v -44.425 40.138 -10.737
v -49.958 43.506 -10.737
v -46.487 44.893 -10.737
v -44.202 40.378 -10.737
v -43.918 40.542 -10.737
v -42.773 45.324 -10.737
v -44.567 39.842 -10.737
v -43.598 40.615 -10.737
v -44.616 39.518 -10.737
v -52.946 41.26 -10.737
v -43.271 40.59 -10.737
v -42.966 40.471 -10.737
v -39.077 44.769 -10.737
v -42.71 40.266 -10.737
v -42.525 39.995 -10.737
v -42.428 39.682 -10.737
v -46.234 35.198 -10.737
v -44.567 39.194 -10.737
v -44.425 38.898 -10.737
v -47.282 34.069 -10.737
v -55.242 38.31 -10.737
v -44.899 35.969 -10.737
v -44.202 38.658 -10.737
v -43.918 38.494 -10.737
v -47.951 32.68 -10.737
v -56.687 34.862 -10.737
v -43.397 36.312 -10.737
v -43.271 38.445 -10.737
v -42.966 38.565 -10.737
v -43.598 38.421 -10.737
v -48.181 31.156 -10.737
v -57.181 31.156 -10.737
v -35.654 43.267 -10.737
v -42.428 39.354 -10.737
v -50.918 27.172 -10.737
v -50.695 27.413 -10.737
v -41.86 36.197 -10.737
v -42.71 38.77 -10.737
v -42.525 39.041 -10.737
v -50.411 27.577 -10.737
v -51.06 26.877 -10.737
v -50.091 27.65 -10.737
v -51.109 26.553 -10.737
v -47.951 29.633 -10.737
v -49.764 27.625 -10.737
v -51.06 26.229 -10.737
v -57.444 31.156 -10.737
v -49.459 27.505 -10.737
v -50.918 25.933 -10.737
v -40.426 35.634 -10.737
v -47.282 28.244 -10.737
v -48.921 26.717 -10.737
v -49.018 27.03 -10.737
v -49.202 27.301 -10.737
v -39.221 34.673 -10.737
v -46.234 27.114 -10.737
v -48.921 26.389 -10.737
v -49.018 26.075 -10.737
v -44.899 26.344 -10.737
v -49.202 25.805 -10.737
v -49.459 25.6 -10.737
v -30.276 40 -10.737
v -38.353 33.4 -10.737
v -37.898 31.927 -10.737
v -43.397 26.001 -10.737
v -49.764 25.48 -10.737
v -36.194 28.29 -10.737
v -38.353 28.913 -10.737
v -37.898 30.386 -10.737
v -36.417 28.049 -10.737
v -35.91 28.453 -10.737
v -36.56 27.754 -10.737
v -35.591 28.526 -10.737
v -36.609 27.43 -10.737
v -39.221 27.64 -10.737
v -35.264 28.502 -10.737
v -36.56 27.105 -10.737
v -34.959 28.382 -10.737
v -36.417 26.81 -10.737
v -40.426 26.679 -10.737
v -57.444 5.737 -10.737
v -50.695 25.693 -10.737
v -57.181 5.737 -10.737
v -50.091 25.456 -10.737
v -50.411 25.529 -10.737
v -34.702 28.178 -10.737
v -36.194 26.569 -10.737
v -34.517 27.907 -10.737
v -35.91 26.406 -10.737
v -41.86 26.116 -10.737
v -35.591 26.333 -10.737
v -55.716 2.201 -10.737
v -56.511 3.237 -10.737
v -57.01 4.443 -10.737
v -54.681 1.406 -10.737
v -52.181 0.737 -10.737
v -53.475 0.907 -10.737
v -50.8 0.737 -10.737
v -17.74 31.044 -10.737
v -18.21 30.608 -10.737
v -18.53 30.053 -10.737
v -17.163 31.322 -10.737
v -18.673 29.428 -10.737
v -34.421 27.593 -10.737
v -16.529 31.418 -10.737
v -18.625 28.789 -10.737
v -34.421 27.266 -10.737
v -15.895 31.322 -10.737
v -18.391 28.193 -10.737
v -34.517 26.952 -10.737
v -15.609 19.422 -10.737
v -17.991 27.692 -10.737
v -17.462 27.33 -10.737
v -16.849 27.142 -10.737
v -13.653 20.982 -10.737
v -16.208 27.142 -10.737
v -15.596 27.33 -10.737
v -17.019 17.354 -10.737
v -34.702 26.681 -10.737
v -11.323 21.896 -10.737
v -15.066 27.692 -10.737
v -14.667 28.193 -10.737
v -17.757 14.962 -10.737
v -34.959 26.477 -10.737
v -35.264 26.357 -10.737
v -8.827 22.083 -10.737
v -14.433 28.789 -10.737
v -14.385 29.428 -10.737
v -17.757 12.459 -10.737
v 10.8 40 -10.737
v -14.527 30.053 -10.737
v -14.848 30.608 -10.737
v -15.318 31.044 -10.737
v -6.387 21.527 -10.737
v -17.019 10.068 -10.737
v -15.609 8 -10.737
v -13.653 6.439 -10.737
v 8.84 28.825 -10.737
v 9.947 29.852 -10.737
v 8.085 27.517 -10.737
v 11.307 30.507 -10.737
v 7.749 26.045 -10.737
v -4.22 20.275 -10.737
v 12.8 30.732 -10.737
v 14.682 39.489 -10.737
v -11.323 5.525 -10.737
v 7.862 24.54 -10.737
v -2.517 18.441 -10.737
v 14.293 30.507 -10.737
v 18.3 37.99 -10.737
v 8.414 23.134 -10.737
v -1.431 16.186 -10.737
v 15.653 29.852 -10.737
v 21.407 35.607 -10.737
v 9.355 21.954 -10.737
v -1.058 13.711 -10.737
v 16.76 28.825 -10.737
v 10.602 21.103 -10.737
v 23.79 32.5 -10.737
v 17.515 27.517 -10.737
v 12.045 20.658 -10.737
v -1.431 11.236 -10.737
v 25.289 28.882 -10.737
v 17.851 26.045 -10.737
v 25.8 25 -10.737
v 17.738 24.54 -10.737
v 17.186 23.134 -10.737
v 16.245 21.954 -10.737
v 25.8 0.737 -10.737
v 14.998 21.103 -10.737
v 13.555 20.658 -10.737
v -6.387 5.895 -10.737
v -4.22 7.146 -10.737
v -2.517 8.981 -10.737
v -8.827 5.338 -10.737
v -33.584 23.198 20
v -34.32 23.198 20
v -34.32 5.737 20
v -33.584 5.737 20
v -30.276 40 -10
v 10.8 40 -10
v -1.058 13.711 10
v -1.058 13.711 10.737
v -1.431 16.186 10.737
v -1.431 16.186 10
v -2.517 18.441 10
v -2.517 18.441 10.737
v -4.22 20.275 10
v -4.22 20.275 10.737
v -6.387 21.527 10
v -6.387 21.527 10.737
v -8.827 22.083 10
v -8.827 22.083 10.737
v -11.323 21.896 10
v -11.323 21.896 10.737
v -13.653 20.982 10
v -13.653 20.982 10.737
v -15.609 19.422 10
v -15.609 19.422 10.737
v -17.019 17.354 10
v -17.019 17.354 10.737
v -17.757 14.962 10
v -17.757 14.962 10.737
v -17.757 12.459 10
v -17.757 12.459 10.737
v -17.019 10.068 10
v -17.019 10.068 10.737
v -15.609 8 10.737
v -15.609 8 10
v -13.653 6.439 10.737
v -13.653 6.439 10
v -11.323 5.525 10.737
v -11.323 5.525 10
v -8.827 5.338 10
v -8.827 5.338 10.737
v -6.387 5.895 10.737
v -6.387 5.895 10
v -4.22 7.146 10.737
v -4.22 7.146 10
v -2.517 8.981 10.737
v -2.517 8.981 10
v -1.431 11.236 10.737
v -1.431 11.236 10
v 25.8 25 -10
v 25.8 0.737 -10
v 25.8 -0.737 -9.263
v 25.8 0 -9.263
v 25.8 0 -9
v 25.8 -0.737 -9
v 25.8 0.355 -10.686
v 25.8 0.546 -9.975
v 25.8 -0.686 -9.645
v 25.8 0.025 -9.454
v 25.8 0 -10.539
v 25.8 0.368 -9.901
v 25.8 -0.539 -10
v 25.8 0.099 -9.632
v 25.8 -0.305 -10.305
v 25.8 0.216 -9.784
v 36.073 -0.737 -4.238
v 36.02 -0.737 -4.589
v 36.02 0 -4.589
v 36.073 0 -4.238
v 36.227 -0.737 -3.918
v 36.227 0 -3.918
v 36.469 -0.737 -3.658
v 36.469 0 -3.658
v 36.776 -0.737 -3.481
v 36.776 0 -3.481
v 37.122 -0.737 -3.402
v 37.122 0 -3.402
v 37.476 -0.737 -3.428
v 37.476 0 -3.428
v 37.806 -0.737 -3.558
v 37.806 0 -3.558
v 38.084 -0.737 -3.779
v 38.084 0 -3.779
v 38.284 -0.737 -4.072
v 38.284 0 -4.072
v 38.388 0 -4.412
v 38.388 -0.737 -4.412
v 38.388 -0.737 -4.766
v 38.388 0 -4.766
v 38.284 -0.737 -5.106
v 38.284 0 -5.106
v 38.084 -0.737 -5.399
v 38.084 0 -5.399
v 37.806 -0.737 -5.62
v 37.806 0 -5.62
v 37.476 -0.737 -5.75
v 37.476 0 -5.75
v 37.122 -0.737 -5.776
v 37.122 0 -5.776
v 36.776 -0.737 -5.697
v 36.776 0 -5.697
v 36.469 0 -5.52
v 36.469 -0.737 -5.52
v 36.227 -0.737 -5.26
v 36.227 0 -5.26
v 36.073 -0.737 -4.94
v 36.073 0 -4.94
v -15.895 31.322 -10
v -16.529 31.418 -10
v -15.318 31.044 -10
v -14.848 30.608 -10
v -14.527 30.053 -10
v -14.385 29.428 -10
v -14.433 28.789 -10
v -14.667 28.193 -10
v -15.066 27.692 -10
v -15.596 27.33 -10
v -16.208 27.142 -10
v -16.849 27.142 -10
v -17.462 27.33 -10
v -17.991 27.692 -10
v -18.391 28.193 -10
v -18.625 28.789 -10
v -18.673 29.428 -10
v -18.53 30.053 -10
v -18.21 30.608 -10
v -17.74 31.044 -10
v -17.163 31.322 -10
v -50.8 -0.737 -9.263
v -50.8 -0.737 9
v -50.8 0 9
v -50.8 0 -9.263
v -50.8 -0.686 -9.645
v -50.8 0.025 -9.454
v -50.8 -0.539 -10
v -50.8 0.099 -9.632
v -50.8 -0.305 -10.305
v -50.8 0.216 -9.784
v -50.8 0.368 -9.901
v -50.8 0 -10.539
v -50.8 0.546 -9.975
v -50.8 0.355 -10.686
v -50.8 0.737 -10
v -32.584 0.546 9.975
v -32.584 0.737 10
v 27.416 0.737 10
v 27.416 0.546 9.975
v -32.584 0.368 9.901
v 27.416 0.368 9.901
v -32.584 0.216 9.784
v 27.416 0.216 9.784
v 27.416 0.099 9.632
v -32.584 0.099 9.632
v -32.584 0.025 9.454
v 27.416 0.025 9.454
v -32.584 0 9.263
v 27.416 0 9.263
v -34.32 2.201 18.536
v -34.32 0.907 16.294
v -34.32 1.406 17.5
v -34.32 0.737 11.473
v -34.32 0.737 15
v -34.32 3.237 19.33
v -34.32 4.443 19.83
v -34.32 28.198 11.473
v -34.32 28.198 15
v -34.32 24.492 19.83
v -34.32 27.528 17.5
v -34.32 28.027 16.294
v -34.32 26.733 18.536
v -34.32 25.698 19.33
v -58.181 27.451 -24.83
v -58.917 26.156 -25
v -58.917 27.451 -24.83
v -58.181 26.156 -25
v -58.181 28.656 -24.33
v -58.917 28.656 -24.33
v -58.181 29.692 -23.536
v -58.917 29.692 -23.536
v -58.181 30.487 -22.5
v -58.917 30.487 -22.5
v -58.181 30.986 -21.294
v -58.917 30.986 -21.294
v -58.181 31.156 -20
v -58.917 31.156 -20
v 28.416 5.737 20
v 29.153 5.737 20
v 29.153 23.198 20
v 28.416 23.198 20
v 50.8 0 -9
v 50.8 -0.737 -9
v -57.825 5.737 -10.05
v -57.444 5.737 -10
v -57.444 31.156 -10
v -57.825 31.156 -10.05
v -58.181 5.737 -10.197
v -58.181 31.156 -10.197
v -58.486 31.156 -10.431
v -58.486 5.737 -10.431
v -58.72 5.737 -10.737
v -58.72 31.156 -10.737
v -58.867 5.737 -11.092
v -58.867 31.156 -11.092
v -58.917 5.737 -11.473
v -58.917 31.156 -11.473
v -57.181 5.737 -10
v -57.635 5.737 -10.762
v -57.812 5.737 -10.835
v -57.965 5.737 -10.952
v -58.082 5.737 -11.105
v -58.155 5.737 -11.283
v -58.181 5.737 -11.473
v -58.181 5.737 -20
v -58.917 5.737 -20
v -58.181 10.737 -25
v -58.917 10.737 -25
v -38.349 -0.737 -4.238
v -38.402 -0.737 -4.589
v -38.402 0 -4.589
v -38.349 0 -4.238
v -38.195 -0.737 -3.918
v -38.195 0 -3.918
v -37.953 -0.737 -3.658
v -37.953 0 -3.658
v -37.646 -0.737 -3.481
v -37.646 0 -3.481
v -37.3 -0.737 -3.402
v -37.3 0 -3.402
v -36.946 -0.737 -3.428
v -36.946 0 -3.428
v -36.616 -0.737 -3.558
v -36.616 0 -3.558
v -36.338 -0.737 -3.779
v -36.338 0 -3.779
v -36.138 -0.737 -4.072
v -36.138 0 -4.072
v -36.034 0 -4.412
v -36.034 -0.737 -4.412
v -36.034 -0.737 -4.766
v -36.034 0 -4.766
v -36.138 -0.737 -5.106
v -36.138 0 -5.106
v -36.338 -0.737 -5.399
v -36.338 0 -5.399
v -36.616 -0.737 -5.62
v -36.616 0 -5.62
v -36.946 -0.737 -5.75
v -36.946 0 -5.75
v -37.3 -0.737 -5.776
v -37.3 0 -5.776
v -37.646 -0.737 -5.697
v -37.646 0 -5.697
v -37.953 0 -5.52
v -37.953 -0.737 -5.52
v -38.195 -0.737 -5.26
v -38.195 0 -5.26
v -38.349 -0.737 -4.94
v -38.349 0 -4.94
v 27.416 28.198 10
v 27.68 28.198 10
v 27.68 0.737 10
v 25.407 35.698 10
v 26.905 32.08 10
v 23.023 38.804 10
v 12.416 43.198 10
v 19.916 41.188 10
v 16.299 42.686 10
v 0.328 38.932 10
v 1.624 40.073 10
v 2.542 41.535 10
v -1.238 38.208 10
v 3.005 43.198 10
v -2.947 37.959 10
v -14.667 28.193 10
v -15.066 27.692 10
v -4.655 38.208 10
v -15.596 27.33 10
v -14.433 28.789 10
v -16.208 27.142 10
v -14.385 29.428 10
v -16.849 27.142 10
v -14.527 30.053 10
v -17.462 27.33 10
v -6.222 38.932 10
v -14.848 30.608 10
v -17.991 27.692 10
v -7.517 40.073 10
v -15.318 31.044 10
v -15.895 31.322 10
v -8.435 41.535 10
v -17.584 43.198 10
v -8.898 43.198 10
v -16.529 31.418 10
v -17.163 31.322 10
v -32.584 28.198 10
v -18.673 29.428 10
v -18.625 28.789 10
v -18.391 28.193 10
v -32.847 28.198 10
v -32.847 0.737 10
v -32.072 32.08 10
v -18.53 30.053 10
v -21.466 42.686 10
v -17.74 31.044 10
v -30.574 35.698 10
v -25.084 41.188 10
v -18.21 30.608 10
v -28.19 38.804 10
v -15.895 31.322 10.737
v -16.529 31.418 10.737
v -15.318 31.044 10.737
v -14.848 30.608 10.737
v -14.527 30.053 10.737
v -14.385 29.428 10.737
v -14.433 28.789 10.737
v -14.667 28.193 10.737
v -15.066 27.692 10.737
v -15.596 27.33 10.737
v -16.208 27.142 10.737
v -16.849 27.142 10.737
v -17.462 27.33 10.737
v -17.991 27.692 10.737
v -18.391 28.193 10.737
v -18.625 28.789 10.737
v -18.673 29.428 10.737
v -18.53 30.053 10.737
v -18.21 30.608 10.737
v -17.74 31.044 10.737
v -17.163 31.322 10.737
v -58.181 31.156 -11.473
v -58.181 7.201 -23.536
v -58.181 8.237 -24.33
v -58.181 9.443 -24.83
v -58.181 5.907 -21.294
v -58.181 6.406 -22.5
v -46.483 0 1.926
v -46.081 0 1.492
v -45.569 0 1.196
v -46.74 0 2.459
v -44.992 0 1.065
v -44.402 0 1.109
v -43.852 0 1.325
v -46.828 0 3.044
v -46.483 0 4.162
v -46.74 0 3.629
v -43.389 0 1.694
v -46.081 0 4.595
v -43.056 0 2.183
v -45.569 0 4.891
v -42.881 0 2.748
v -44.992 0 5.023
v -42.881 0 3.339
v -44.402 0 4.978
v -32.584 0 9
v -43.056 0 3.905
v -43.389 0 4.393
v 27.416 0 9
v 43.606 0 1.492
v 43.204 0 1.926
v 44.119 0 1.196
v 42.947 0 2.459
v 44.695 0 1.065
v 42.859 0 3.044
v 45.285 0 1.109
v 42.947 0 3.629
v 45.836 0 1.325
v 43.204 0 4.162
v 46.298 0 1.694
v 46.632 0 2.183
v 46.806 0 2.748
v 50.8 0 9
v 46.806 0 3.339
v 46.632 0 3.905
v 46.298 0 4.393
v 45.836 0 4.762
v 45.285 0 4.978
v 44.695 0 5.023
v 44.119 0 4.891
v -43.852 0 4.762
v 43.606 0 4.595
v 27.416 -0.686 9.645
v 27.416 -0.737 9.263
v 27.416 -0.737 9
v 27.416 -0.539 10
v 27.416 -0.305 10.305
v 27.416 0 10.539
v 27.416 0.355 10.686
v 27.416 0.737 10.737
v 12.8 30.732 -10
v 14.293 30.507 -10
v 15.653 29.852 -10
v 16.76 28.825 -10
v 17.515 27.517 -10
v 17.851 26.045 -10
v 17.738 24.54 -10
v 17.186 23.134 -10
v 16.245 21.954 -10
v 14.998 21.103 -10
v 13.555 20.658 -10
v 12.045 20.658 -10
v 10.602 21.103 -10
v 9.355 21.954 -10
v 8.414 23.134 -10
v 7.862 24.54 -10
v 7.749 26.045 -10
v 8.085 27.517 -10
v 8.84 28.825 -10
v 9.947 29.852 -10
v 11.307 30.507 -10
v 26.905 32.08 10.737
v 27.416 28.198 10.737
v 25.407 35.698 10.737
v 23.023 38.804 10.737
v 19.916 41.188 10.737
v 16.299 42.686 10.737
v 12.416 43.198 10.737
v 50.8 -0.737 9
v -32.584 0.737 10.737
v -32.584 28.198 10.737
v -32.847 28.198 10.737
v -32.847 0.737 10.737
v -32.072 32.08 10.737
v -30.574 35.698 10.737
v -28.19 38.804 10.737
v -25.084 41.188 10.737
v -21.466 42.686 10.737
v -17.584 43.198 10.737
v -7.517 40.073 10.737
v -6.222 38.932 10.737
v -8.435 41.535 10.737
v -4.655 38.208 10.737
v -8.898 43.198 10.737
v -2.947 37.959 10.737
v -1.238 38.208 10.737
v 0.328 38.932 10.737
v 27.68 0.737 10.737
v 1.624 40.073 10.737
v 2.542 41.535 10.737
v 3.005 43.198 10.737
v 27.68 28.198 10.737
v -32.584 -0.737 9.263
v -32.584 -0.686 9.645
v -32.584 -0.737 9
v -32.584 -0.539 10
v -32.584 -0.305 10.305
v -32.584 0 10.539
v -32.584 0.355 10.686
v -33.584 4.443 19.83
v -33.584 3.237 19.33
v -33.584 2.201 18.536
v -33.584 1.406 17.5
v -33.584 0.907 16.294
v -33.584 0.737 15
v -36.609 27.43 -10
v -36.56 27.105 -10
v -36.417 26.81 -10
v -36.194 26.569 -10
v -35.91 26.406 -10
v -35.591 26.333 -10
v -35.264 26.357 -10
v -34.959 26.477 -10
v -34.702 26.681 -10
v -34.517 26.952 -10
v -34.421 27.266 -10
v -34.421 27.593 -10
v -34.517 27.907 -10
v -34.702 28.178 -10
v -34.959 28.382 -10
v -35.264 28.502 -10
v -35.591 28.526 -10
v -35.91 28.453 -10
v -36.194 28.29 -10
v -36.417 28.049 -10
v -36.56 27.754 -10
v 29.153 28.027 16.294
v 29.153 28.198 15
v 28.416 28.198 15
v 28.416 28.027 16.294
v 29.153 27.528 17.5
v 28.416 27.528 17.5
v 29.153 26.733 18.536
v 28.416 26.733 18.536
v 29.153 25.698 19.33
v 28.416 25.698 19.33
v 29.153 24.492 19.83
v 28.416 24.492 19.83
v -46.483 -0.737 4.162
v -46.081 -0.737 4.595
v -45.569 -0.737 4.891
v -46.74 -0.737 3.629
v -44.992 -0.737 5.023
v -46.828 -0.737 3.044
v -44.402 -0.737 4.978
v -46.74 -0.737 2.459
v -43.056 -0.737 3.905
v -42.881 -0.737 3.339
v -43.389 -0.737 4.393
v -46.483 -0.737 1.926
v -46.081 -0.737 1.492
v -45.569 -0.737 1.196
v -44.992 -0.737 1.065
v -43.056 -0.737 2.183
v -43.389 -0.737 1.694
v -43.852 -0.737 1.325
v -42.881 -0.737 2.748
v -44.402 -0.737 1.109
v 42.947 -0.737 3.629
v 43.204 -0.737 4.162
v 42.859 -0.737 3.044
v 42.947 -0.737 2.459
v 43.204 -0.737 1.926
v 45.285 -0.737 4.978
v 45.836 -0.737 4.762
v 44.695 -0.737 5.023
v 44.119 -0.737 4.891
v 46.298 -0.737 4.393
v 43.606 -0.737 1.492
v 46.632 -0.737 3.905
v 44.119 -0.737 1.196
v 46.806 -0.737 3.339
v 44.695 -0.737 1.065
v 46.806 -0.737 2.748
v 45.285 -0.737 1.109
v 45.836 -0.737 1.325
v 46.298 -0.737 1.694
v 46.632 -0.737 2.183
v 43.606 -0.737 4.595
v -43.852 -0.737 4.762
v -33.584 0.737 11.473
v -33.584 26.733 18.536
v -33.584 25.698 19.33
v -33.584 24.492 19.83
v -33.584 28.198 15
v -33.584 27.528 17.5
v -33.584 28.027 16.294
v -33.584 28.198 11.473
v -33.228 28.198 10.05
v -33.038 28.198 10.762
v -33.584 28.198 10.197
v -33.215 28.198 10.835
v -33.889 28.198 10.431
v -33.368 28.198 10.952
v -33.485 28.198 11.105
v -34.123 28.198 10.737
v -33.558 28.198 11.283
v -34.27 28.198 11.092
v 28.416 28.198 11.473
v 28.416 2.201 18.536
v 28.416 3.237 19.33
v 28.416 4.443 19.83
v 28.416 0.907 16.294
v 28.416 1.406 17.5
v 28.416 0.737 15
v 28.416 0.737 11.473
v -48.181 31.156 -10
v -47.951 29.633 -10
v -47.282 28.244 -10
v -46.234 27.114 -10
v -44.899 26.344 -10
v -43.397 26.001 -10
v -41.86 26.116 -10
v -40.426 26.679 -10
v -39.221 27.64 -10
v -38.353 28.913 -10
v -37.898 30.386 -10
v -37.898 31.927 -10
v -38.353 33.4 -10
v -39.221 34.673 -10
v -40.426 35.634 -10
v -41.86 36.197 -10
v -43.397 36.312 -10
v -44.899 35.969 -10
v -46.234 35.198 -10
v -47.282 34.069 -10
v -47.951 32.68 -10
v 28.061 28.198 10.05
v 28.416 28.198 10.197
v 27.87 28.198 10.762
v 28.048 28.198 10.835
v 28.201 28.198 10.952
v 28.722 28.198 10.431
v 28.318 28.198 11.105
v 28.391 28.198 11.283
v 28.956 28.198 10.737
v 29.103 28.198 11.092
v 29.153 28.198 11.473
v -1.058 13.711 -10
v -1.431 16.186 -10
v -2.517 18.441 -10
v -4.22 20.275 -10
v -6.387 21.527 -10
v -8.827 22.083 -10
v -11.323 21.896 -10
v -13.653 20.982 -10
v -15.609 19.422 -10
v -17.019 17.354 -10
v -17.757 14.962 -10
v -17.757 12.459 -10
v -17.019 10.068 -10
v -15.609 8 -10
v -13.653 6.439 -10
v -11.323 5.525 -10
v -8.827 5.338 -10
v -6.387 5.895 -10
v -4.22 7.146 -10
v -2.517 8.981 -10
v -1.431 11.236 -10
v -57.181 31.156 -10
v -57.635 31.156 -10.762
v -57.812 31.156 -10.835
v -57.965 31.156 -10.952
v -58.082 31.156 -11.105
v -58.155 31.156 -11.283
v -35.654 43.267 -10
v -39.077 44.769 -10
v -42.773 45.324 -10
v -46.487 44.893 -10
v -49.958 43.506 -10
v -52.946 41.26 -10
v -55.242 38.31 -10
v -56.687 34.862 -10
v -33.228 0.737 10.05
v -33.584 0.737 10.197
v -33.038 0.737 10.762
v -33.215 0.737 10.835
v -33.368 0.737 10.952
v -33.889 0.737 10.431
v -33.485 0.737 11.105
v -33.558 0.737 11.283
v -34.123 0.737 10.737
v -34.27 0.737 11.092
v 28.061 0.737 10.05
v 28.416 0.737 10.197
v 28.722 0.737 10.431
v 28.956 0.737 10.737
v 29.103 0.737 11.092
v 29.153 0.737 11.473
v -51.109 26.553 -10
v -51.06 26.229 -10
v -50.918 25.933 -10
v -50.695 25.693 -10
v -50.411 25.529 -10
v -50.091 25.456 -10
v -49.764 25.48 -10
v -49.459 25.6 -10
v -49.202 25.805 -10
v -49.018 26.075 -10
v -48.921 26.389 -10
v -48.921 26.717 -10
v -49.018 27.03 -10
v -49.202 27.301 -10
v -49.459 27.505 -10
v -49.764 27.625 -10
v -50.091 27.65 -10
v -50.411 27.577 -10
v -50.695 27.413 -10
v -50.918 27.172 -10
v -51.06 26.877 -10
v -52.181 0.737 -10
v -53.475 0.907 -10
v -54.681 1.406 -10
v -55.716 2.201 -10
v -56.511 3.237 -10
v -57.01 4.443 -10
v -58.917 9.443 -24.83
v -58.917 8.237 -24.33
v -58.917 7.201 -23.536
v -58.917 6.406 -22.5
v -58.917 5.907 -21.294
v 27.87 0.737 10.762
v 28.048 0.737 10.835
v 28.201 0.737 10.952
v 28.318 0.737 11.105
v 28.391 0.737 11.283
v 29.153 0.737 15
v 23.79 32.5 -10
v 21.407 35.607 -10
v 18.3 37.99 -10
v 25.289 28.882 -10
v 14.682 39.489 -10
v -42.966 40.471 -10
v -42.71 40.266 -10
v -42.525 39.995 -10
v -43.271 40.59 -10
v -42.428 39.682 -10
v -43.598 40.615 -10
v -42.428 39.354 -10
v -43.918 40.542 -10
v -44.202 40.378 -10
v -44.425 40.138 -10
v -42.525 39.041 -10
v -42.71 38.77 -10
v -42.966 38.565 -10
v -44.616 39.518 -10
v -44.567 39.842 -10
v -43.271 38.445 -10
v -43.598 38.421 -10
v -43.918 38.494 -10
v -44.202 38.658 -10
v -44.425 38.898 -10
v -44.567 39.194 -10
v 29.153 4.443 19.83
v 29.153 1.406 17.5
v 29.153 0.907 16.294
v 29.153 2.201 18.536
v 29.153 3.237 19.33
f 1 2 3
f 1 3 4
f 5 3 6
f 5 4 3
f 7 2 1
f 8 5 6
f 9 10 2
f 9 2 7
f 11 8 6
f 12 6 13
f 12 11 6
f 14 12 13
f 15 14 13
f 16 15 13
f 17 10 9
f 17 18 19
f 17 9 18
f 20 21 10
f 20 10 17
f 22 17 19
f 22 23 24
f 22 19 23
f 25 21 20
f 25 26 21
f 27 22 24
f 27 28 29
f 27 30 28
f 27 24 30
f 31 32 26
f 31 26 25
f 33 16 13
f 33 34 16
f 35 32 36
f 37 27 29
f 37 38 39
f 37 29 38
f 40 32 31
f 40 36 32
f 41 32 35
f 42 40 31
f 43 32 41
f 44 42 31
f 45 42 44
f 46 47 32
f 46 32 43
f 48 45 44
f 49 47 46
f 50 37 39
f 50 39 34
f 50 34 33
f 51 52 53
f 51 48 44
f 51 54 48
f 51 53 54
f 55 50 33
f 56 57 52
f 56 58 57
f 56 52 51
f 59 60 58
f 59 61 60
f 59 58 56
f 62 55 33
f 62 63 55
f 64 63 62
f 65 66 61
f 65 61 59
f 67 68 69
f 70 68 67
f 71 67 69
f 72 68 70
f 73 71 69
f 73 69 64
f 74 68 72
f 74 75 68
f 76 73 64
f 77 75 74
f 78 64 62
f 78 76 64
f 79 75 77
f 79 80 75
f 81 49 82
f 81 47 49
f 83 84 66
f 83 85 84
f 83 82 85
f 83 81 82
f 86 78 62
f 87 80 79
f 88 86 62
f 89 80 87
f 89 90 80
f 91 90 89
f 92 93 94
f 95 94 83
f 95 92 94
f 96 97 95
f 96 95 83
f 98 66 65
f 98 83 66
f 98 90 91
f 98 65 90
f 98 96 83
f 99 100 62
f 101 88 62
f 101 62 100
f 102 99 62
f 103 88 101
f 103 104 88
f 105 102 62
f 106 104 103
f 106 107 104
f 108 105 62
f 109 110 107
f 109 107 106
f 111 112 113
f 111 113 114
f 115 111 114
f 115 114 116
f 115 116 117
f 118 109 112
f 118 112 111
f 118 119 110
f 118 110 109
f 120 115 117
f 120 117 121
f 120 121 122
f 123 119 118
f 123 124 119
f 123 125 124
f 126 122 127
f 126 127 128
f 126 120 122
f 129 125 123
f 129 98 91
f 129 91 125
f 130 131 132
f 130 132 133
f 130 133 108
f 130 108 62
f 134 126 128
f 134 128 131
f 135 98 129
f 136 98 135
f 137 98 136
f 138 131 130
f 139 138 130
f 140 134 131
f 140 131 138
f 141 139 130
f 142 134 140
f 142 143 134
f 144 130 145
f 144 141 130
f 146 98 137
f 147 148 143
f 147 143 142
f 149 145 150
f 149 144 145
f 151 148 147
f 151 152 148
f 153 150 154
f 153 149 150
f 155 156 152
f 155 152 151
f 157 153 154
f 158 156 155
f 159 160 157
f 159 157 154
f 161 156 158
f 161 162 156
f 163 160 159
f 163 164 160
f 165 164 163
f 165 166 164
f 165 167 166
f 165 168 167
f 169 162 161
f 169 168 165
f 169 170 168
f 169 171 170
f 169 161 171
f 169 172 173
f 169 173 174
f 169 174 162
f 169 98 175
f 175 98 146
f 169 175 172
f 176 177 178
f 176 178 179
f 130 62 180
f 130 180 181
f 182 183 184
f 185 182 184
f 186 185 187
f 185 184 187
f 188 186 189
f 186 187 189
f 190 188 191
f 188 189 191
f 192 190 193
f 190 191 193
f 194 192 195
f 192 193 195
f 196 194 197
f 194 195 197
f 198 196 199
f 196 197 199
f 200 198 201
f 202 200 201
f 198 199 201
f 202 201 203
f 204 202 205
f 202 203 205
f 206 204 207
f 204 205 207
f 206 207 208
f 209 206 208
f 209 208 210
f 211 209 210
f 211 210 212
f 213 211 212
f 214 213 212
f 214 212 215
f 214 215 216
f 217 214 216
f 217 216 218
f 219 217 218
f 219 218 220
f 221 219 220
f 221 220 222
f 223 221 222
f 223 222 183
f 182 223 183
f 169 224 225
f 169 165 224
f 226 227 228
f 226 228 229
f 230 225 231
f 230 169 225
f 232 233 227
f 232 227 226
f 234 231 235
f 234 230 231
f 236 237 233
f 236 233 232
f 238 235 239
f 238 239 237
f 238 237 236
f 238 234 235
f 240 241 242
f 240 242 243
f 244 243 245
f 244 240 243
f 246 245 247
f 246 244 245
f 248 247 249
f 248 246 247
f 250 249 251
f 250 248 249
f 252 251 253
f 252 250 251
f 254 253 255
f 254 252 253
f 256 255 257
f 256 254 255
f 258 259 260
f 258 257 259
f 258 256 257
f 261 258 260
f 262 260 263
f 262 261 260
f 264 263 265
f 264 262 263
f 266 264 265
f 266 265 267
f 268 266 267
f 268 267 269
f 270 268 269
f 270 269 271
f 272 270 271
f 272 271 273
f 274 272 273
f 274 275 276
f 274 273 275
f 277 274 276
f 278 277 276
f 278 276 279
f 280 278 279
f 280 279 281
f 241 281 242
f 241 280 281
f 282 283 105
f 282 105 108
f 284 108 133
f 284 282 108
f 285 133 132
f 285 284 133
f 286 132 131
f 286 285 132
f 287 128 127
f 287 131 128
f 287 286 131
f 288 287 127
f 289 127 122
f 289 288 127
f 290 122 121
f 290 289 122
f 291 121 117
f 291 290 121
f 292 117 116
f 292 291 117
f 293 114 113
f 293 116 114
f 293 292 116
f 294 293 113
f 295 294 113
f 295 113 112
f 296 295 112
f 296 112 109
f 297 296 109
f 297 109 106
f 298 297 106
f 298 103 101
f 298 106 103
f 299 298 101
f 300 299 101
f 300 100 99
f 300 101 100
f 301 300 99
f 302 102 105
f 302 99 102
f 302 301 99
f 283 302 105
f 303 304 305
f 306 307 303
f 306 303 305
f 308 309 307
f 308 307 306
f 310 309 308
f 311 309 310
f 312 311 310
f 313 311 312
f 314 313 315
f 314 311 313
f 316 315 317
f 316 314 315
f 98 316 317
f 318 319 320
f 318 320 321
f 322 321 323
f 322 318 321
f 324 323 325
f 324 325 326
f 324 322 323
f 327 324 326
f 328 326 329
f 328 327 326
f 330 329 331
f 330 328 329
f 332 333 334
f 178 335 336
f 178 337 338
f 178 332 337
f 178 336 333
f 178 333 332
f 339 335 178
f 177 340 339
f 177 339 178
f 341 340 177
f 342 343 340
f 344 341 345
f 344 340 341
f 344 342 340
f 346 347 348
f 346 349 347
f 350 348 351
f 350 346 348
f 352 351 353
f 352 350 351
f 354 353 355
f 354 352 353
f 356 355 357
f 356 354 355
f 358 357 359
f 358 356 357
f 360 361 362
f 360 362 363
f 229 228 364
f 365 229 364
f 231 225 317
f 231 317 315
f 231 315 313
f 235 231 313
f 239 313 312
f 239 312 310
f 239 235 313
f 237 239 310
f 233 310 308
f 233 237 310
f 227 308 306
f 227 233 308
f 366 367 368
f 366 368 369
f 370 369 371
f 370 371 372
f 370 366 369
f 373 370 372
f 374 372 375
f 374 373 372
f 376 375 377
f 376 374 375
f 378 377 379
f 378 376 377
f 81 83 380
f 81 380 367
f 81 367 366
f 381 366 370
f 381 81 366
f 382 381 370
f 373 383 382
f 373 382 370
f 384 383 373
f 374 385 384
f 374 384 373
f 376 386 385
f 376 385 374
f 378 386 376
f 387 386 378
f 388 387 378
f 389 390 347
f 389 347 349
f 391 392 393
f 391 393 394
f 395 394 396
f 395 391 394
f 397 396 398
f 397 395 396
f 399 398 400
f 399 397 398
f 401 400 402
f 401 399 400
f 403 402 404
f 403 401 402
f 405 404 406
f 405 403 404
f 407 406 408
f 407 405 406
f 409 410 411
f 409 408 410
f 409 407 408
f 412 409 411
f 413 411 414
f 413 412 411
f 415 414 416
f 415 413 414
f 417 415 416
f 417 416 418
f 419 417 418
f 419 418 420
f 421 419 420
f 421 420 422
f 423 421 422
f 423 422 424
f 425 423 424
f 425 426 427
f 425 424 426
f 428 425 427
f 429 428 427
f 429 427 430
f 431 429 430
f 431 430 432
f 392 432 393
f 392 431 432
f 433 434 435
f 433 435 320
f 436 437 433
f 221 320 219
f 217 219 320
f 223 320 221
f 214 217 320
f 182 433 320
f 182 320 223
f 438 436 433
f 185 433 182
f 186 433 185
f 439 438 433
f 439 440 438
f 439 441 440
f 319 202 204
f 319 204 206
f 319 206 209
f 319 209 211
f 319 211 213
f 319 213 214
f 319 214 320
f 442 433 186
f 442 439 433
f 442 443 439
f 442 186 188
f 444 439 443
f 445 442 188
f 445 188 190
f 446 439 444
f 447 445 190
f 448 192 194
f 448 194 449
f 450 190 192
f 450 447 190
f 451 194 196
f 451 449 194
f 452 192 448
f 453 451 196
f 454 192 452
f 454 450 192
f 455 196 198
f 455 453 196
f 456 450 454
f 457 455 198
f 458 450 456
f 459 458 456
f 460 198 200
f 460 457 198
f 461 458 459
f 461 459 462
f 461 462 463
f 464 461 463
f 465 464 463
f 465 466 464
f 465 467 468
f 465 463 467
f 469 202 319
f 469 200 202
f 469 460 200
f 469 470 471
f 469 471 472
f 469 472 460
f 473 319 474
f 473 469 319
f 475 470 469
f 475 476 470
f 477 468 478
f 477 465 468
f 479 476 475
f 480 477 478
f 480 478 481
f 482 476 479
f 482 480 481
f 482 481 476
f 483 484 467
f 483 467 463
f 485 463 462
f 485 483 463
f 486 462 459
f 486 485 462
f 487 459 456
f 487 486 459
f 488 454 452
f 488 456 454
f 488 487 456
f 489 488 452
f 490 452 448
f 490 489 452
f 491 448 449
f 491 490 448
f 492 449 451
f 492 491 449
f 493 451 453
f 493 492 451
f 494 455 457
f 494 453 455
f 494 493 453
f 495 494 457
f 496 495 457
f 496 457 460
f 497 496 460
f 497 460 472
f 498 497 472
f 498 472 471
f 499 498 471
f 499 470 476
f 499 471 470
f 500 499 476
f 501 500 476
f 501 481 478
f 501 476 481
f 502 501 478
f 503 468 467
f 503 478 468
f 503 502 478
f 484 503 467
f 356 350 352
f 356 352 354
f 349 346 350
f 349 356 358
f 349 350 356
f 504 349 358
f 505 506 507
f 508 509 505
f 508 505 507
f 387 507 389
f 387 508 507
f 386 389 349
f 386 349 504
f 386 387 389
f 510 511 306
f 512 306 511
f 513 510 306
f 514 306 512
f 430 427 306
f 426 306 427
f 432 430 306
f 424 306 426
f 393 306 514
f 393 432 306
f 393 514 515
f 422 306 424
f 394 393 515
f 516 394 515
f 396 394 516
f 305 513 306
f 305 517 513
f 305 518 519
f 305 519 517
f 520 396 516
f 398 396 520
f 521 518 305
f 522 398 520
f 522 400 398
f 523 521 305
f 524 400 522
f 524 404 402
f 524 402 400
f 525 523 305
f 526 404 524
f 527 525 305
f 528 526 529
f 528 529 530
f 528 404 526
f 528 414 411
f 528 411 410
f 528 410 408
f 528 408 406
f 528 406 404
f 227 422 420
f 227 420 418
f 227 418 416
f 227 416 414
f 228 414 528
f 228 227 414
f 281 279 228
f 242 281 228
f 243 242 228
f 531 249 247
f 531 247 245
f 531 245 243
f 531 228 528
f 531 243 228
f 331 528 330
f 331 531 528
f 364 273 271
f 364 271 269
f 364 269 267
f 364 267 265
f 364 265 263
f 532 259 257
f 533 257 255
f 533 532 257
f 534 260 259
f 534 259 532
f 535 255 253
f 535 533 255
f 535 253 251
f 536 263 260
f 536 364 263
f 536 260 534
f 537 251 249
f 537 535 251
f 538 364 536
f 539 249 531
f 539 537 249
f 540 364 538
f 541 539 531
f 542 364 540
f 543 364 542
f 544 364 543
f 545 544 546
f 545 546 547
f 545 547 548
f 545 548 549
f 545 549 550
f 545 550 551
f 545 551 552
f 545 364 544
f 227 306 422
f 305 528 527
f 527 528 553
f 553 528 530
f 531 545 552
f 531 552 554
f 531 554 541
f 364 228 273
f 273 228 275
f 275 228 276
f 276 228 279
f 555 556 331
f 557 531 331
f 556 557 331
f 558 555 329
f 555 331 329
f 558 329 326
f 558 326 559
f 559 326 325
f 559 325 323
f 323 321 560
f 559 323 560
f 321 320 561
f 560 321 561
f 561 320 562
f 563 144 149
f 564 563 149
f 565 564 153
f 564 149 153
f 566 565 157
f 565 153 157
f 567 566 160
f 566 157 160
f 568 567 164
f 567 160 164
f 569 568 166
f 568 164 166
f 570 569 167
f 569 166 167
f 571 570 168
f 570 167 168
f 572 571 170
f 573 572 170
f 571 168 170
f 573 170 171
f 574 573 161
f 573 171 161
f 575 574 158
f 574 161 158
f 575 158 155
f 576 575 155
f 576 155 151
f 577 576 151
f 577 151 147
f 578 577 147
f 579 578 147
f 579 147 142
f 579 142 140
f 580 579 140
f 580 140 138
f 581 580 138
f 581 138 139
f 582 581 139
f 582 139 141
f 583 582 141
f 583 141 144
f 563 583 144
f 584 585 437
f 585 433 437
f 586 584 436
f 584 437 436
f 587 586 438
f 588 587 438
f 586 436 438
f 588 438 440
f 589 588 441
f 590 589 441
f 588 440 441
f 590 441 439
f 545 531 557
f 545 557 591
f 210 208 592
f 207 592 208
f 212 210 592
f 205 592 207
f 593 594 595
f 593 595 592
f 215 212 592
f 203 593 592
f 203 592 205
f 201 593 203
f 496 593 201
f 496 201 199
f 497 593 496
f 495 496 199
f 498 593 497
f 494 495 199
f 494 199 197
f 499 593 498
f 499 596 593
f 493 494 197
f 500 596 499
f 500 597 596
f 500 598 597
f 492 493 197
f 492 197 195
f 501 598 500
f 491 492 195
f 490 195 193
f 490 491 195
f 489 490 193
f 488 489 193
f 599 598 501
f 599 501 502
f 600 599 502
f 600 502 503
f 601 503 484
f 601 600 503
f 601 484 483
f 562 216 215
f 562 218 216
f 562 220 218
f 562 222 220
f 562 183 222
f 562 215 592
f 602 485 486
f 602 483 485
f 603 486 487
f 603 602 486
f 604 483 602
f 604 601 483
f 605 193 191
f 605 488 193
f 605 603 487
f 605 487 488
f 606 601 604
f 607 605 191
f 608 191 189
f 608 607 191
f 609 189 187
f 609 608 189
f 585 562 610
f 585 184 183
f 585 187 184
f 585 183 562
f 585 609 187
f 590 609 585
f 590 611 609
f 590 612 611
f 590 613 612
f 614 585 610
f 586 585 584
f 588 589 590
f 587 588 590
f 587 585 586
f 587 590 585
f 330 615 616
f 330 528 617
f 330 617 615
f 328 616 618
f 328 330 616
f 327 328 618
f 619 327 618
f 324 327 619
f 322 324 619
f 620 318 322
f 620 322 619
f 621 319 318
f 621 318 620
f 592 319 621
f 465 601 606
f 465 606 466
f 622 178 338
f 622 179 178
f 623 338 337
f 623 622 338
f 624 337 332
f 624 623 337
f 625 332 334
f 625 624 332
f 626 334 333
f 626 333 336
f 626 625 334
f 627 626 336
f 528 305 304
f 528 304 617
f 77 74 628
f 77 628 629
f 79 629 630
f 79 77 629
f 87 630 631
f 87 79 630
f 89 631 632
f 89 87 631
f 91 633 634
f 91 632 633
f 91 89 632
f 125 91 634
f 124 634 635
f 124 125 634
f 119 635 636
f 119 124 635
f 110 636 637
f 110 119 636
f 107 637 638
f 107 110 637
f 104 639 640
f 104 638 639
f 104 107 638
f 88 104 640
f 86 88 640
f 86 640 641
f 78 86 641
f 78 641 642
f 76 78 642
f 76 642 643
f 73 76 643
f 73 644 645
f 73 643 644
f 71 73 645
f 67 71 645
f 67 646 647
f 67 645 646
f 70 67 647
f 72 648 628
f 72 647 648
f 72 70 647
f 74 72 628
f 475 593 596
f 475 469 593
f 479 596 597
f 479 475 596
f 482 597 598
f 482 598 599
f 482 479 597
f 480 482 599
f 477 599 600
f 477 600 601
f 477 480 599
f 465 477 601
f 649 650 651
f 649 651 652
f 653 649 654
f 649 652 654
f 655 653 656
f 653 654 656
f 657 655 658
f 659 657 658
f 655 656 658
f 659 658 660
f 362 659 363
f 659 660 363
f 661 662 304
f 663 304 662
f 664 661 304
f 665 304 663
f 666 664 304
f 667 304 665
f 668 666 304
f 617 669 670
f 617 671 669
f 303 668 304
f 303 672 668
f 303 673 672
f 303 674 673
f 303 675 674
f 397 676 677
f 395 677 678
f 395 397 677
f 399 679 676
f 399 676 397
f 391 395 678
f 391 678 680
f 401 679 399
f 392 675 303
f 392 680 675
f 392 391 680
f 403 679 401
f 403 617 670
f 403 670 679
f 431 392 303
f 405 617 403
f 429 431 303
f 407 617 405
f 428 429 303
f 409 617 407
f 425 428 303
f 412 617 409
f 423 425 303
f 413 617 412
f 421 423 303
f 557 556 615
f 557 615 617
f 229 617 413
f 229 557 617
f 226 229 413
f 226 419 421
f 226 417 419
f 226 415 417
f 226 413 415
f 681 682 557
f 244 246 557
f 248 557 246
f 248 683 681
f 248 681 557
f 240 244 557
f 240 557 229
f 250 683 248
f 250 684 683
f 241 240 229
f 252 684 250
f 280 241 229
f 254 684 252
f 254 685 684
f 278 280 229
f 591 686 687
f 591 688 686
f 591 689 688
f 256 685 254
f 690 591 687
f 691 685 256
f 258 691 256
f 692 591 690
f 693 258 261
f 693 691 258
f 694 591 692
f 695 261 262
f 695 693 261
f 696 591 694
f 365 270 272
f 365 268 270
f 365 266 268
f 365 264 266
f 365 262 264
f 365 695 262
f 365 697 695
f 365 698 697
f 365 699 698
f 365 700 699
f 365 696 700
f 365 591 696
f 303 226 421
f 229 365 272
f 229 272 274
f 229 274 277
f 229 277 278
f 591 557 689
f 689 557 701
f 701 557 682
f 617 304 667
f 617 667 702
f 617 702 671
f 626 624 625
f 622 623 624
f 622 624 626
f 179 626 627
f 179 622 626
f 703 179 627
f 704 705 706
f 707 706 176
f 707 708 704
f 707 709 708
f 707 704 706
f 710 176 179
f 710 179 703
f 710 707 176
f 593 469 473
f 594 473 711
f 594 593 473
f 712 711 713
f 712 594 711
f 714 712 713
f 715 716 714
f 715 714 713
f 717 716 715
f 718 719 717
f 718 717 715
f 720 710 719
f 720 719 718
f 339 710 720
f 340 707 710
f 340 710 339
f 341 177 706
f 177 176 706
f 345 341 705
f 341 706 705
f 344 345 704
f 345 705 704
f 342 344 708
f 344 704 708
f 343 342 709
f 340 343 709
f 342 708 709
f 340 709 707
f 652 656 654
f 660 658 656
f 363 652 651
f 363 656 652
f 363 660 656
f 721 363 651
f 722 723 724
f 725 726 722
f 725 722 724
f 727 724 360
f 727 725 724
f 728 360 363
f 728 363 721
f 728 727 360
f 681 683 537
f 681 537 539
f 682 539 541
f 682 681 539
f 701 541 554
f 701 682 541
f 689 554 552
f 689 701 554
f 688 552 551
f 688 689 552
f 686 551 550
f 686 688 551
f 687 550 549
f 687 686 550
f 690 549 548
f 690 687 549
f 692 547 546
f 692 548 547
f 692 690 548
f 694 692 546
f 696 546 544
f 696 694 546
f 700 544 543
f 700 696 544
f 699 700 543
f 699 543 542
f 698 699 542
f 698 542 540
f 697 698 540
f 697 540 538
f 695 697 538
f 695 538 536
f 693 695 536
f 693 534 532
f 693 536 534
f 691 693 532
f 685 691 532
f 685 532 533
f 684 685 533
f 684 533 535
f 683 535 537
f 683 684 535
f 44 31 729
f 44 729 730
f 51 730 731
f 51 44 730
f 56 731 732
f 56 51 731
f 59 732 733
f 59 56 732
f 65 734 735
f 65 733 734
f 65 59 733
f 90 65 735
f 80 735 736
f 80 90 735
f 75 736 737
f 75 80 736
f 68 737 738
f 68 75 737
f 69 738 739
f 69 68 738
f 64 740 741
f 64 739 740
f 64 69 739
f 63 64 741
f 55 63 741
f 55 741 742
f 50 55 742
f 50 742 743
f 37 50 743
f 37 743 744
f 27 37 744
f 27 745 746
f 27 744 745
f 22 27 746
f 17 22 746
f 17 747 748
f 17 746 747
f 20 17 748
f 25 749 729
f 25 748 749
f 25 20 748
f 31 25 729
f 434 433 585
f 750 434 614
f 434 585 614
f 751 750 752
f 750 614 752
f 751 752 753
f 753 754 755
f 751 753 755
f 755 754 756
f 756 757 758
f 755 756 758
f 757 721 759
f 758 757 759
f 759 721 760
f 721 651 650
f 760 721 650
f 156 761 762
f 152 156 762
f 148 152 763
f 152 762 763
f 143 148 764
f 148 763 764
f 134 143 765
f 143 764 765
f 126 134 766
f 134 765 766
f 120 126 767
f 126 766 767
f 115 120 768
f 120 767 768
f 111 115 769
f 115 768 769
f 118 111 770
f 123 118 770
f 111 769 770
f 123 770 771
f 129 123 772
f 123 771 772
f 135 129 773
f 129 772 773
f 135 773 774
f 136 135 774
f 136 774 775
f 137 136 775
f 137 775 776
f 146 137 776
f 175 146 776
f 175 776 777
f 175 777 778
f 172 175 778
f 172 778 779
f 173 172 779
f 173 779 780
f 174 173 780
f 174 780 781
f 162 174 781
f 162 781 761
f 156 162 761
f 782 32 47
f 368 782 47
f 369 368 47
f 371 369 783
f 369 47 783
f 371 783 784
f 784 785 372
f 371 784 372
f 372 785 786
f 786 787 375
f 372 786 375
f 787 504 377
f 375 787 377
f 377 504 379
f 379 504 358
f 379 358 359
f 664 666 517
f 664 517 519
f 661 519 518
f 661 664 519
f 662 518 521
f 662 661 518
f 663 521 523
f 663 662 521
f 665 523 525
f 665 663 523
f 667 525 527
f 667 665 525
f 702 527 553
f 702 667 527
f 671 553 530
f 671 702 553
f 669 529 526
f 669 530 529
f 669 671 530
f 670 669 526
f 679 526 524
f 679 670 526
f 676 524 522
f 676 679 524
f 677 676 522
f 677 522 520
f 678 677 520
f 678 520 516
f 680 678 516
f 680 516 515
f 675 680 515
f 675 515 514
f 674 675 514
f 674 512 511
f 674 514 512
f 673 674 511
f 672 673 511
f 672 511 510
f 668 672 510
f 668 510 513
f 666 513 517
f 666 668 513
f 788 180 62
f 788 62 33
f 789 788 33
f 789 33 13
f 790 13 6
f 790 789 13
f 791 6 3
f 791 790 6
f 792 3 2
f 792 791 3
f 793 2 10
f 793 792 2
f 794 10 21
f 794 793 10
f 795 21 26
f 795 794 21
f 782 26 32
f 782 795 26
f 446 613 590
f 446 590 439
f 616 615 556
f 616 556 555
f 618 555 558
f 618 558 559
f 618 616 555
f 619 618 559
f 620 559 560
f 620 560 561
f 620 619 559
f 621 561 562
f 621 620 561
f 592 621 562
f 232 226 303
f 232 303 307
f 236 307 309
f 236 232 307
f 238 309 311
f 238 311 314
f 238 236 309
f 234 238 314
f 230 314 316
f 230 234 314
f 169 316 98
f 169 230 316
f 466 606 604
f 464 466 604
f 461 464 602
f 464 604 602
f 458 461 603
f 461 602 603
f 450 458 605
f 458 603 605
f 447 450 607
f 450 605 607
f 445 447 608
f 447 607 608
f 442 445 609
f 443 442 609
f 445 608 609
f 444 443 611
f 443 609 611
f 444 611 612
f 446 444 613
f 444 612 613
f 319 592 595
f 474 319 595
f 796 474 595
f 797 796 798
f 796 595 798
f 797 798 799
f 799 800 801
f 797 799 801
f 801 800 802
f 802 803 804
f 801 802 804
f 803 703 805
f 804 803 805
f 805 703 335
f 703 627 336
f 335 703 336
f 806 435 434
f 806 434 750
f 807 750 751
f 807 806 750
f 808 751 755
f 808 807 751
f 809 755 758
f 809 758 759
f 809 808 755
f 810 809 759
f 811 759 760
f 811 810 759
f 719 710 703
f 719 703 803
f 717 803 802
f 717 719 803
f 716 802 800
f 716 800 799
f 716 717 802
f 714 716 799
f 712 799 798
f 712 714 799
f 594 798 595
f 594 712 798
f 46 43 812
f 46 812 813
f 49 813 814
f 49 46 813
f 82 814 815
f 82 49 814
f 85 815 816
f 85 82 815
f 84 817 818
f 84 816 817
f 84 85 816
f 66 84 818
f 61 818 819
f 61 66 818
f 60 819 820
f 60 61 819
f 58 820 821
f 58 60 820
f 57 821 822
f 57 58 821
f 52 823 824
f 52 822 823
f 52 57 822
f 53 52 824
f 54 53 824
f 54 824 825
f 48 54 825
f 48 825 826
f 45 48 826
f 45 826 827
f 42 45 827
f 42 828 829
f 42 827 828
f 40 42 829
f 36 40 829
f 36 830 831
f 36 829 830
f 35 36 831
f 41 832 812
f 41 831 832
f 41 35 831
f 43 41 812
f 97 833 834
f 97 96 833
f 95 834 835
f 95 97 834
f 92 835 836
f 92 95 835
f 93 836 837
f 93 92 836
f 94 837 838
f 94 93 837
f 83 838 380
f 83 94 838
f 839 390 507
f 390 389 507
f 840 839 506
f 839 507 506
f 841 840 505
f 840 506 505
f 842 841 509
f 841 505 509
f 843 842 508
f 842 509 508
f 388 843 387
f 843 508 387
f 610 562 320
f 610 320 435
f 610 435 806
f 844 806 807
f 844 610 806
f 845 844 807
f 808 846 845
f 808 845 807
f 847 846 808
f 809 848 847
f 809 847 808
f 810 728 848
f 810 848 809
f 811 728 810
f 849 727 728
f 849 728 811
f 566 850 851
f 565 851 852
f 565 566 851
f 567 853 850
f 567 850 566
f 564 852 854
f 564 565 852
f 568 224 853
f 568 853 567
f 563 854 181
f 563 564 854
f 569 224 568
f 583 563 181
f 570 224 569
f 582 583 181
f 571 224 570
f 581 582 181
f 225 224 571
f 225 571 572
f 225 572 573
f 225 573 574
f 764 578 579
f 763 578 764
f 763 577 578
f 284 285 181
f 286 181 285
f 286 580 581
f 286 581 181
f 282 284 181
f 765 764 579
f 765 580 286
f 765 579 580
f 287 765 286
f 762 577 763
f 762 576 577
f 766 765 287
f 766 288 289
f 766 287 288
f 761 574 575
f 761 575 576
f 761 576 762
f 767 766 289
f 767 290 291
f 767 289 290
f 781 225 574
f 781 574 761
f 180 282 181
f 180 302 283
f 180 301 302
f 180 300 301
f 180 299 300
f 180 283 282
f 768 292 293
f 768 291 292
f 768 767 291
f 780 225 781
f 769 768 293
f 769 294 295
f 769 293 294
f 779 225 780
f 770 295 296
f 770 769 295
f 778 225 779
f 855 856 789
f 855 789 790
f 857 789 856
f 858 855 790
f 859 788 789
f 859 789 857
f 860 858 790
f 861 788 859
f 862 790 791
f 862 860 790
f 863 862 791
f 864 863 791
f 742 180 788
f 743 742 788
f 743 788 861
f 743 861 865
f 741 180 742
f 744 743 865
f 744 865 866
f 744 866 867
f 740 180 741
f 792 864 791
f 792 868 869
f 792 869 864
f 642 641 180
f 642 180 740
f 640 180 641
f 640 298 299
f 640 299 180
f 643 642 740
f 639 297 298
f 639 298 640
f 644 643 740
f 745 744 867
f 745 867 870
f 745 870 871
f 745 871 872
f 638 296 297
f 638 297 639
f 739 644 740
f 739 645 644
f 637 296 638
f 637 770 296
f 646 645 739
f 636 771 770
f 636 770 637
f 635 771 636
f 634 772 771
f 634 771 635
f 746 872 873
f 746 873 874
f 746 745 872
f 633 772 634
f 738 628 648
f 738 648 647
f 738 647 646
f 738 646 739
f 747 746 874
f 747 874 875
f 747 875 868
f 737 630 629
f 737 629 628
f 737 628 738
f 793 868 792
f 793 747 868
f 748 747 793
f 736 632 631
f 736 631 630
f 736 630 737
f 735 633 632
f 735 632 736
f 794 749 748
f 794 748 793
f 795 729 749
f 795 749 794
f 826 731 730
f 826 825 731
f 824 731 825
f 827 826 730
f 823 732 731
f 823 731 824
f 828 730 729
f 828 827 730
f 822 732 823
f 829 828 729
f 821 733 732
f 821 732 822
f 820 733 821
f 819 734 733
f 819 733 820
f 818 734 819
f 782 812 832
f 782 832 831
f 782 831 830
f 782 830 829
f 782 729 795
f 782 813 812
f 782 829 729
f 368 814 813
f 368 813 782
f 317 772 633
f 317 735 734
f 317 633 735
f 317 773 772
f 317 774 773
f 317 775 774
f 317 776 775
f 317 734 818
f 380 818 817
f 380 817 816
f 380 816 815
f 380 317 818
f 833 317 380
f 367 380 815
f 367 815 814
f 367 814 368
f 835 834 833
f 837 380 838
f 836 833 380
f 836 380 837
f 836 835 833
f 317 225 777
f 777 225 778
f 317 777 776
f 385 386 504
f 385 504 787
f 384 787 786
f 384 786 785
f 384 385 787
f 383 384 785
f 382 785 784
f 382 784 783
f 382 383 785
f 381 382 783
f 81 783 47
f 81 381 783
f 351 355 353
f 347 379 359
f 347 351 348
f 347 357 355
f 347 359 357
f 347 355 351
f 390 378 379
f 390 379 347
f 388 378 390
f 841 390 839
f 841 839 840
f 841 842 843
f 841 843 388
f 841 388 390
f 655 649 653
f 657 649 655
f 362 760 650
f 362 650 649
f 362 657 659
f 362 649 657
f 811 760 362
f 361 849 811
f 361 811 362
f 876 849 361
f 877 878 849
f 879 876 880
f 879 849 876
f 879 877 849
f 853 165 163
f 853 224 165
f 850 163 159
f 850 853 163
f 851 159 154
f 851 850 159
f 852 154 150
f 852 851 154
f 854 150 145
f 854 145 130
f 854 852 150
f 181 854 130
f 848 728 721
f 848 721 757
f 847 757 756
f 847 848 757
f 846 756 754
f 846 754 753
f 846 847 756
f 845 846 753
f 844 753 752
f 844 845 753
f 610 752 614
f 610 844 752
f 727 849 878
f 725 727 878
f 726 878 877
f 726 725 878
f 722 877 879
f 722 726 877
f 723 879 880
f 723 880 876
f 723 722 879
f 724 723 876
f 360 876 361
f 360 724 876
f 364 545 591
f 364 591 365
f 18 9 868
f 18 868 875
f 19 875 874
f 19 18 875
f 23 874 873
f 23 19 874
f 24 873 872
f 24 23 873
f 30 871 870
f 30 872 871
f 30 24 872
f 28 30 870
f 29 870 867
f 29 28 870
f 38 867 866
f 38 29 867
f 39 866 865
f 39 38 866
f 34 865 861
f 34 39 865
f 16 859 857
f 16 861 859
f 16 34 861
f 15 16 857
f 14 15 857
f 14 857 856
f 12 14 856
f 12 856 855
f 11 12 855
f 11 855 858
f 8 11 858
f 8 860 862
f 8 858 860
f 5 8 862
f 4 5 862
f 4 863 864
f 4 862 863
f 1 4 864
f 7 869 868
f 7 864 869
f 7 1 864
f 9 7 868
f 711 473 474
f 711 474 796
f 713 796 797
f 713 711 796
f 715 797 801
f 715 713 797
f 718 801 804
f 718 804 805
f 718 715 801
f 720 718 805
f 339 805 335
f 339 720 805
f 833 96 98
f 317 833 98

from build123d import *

# Parameters (mm, degrees)
SKETCH1_W                = 101.6
SKETCH1_H                = 18
BASE_FLANGE1_DEPTH       = 0.7366
CUT_EXTRUDE1_DEPTH       = 248.362817644
CUT_EXTRUDE1_DEPTH_BACK  = 248.362817644
SKETCH9_R                = 1.984375
SKETCH9_R_2              = 1.190625
EDGE_FLANGE2_DEPTH       = 60
CUT_EXTRUDE10_DEPTH      = 276.770749451
CUT_EXTRUDE10_DEPTH_BACK = 276.770749451
SKETCH47_R               = 5.065
SKETCH48_R               = 6
CUT_EXTRUDE11_DEPTH      = 10
EDGE_FLANGE4_DEPTH       = 76.6
EDGE_FLANGE4_START       = 0.7366
EDGE_FLANGE4_FLAT_DEPTH  = 0.7366
CUT_EXTRUDE12_DEPTH      = 105.880550385
CUT_EXTRUDE12_DEPTH_BACK = 105.880550385
SKETCH52_R               = 2.15
TAB1_START               = -0.7366
TAB1_OUTLINE_W           = 10
TAB1_OUTLINE_H           = 49.408594005
TAB1_DEPTH               = 0.7366
SKETCH56_R               = 5.065
CUT_EXTRUDE13_DEPTH      = 5
CUT_EXTRUDE16_DEPTH      = 105.732220975
CUT_EXTRUDE16_DEPTH_BACK = 105.732220975
SKETCH59_R               = 1.1
SKETCH59_R_2             = 5.17
CUT_EXTRUDE18_DEPTH      = 10
FILLET1_R                = 5
EDGE_FLANGE5_DEPTH       = 25.419820015
FILLET2_R                = 5
FILLET3_R                = 15
EDGE_FLANGE6_DEPTH       = 27.460964596
EDGE_FLANGE6_BEND_DEPTH  = 27.460964596
FILLET4_R                = 5
SKETCH71_R               = 8.39617584
CUT_EXTRUDE19_DEPTH      = 83.479179892


# Read off the part's stored shape, not the designer's step: Tab1
# Sheet-metal steps are written as plain solids
with BuildPart() as part:
    # Sketch1 → Base-Flange1 (new body)
    with BuildSketch(Plane(origin=(0, 0, 0), x_dir=(1, 0, 0), z_dir=(0, 1, 0))):
        Rectangle(SKETCH1_W, SKETCH1_H)
    extrude(amount=-BASE_FLANGE1_DEPTH)

    # Sketch9 → Cut-Extrude1 (cut, two sides: drawn at the far end of the back side and taken through both)
    with BuildSketch(Plane(origin=(-165.711822879, -0.7366, -110.626299478), x_dir=(0.7071067811865437, 0, -0.7071067811865515), z_dir=(0, 1, 0)).offset(-CUT_EXTRUDE1_DEPTH_BACK)):
        with Locations(Location((5.089841868, -165.843496765, 0), (0, 0, 135))):
            Circle(SKETCH9_R)
        with Locations(Location((15.884109726, -165.843496765, 0), (0, 0, 135))):
            Circle(SKETCH9_R_2)
        with Locations(Location((68.508410595, -229.262065492, 0), (0, 0, 135))):
            Circle(SKETCH9_R)
        with Locations(Location((68.508410595, -218.467797635, 0), (0, 0, 135))):
            Circle(SKETCH9_R_2)
    extrude(amount=CUT_EXTRUDE1_DEPTH + CUT_EXTRUDE1_DEPTH_BACK, mode=Mode.SUBTRACT)

    # Edge-Flange2 section (across the edge) → Edge-Flange2 (add)
    with BuildSketch(Plane(origin=(-32.583570882, 0, 10), x_dir=(0, 0, -1), z_dir=(1, 0, 0))):
        with BuildLine():
            Line((-0.7366, 0.7366), (-0.7366, 43.197564596))
            Line((-0.7366, 43.197564596), (0, 43.197564596))
            Line((0, 43.197564596), (0, 0.7366))
            ThreePointArc((0, 0.7366), (0.215745145, 0.215745145), (0.7366, 0))
            Line((0.7366, 0), (1, 0))
            Line((1, 0), (1, -0.7366))
            Line((1, -0.7366), (0.7366, -0.7366))
            ThreePointArc((0.7366, -0.7366), (-0.30510971, -0.30510971), (-0.7366, 0.7366))
        make_face()
    extrude(amount=EDGE_FLANGE2_DEPTH)

    # Sketch47 → Cut-Extrude10 (cut, two sides: drawn at the far end of the back side and taken through both)
    with BuildSketch(Plane(origin=(-165.711822879, -125.530580752, -15.7766), x_dir=(1, 0, 0), z_dir=(0, 0, 1)).offset(-CUT_EXTRUDE10_DEPTH_BACK)):
        with Locations((162.765212711, 169.489973714)):
            Circle(SKETCH47_R)
    extrude(amount=CUT_EXTRUDE10_DEPTH + CUT_EXTRUDE10_DEPTH_BACK, mode=Mode.SUBTRACT)

    # Sketch48 → Cut-Extrude11 (cut)
    with BuildSketch(Plane.XY.offset(10.7366)):
        with Locations((-2.946610168, 43.959392962)):
            Circle(SKETCH48_R)
    extrude(amount=-CUT_EXTRUDE11_DEPTH, mode=Mode.SUBTRACT)

    # Edge-Flange4 bend section (across the edge) → Edge-Flange4 (add)
    with BuildSketch(Plane(origin=(25.8, 0, -10), x_dir=(0, 0, 1), z_dir=(-1, 0, 0))):
        with BuildLine():
            Line((-0.7366, 0.7366), (0, 0.7366))
            ThreePointArc((0, 0.7366), (0.215745145, 0.215745145), (0.7366, 0))
            Line((0.7366, 0), (1, 0))
            Line((1, 0), (1, -0.7366))
            Line((1, -0.7366), (0.7366, -0.7366))
            ThreePointArc((0.7366, -0.7366), (-0.30510971, -0.30510971), (-0.7366, 0.7366))
        make_face()
    extrude(amount=EDGE_FLANGE4_DEPTH)

    # Edge-Flange4 profile (on flange) → Edge-Flange4 flat (add)
    with BuildSketch(Plane(origin=(0, 0, -10), x_dir=(-1, 0, 0), z_dir=(0, 0, -1)).offset(EDGE_FLANGE4_START)):
        Polygon((-25.8, 40), (-25.8, 0.7366), (50.8, 0.7366), (50.8, 40), (50.8, 50.145194005), (30.27574847, 50.145194005), (30.27574847, 40), align=None)
    extrude(amount=-EDGE_FLANGE4_FLAT_DEPTH)

    # Sketch52 → Cut-Extrude12 (cut, two sides: drawn at the far end of the back side and taken through both)
    with BuildSketch(Plane(origin=(-25.053389833, -19.029185513, -10.7366), x_dir=(-1, 0, 0), z_dir=(0, 0, -1)).offset(-CUT_EXTRUDE12_DEPTH_BACK)):
        with Locations(Location((-8.524599638, 48.296752149, 0), (0, 0, 90))):
            Circle(SKETCH52_R)
    extrude(amount=CUT_EXTRUDE12_DEPTH + CUT_EXTRUDE12_DEPTH_BACK, mode=Mode.SUBTRACT)

    # Tab1 outline → Tab1 (add)
    with BuildSketch(Plane.XY.offset(-10).offset(TAB1_START)):
        with Locations((-55.8, 25.440897003)):
            Rectangle(TAB1_OUTLINE_W, TAB1_OUTLINE_H)
    extrude(amount=TAB1_DEPTH)

    # Sketch56 → Cut-Extrude13 (cut)
    with BuildSketch(Plane(origin=(-25.053389833, -19.029185513, -11.4732), x_dir=(-1, 0, 0), z_dir=(0, 0, -1))):
        with Locations(Location((-37.853389832, 44.695992962, 0), (0, 0, 90))):
            Circle(SKETCH56_R)
    extrude(amount=-CUT_EXTRUDE13_DEPTH, mode=Mode.SUBTRACT)

    # Sketch59 → Cut-Extrude16 (cut, two sides: drawn at the far end of the back side and taken through both)
    with BuildSketch(Plane(origin=(-25.053389833, -19.029185513, -10), x_dir=(1, 0, 0), z_dir=(0, 0, 1)).offset(-CUT_EXTRUDE16_DEPTH_BACK)):
        with Locations(Location((-24.955394773, 45.581923383, 0), (0, 0, 180))):
            Circle(SKETCH59_R)
        with Locations(Location((-17.957123001, 50.185605529, 0), (0, 0, 180))):
            Circle(SKETCH59_R_2)
        with Locations(Location((-18.462707804, 58.547069581, 0), (0, 0, 180))):
            Circle(SKETCH59_R)
        with Locations(Location((-10.455133223, 46.458697096, 0), (0, 0, 180))):
            Circle(SKETCH59_R)
    extrude(amount=CUT_EXTRUDE16_DEPTH + CUT_EXTRUDE16_DEPTH_BACK, mode=Mode.SUBTRACT)

    # Sketch61 → Cut-Extrude18 (cut)
    with BuildSketch(Plane.XY.offset(-10)):
        with BuildLine():
            Line((-57.180512833, 31.156420015), (-57.180512833, 0.7366))
            Line((-57.180512833, 0.7366), (-60.8, 0.7366))
            Line((-60.8, 0.7366), (-60.8, 50.145194005))
            Line((-60.8, 50.145194005), (-30.27574847, 50.145194005))
            Line((-30.27574847, 50.145194005), (-30.27574847, 40))
            Line((-30.27574847, 40), (-35.653602425, 43.266943094))
            ThreePointArc((-35.653602425, 43.266943094), (-49.958227548, 43.506244316), (-57.180512833, 31.156420015))
        make_face()
    extrude(amount=-CUT_EXTRUDE18_DEPTH, mode=Mode.SUBTRACT)

    # Fillet1
    fillet1_edges = [part.edges().sort_by_distance(p)[0] for p in [
        (-57.180512833, 0.7366, -10.3683),
    ]]
    fillet(fillet1_edges, radius=FILLET1_R)

    # Edge-Flange5 section (across the edge) → Edge-Flange5 (add)
    with BuildSketch(Plane(origin=(-58.180512833, 5.7366, -10.7366), x_dir=(1, 0, 0), z_dir=(0, 1, 0))):
        with BuildLine():
            Line((-0.7366, 0.7366), (-0.7366, 14.2634))
            Line((-0.7366, 14.2634), (0, 14.2634))
            Line((0, 14.2634), (0, 0.7366))
            ThreePointArc((0, 0.7366), (0.215745145, 0.215745145), (0.7366, 0))
            Line((0.7366, 0), (1, 0))
            Line((1, 0), (1, -0.7366))
            Line((1, -0.7366), (0.7366, -0.7366))
            ThreePointArc((0.7366, -0.7366), (-0.30510971, -0.30510971), (-0.7366, 0.7366))
        make_face()
    extrude(amount=EDGE_FLANGE5_DEPTH)

    # Fillet2
    fillet2_edges = [part.edges().sort_by_distance(p)[0] for p in [
        (-58.548812833, 5.7366, -25),
        (-58.548812833, 31.156420015, -25),
    ]]
    fillet(fillet2_edges, radius=FILLET2_R)

    # Fillet3
    fillet3_edges = [part.edges().sort_by_distance(p)[0] for p in [
        (25.8, 40, -10.3683),
        (-32.583570882, 43.197564596, 10.3683),
        (27.416429118, 43.197564596, 10.3683),
    ]]
    fillet(fillet3_edges, radius=FILLET3_R)

    # Edge-Flange6 section (across the edge) → Edge-Flange6 (add)
    with BuildSketch(Plane(origin=(28.416429118, 0.7366, 10.7366), x_dir=(-1, 0, 0), z_dir=(0, 1, 0))):
        with BuildLine():
            Line((-0.7366, 0.7366), (-0.7366, 9.2634))
            Line((-0.7366, 9.2634), (0, 9.2634))
            Line((0, 9.2634), (0, 0.7366))
            ThreePointArc((0, 0.7366), (0.215745145, 0.215745145), (0.7366, 0))
            Line((0.7366, 0), (1, 0))
            Line((1, 0), (1, -0.7366))
            Line((1, -0.7366), (0.7366, -0.7366))
            ThreePointArc((0.7366, -0.7366), (-0.30510971, -0.30510971), (-0.7366, 0.7366))
        make_face()
    extrude(amount=EDGE_FLANGE6_DEPTH)

    # Edge-Flange6 section 2 (across the edge) → Edge-Flange6 bend (add)
    with BuildSketch(Plane(origin=(-33.583570882, 28.197564596, 10.7366), x_dir=(1, 0, 0), z_dir=(0, -1, 0))):
        with BuildLine():
            Line((-0.7366, 0.7366), (-0.7366, 9.2634))
            Line((-0.7366, 9.2634), (0, 9.2634))
            Line((0, 9.2634), (0, 0.7366))
            ThreePointArc((0, 0.7366), (0.215745145, 0.215745145), (0.7366, 0))
            Line((0.7366, 0), (1, 0))
            Line((1, 0), (1, -0.7366))
            Line((1, -0.7366), (0.7366, -0.7366))
            ThreePointArc((0.7366, -0.7366), (-0.30510971, -0.30510971), (-0.7366, 0.7366))
        make_face()
    extrude(amount=EDGE_FLANGE6_BEND_DEPTH)

    # Fillet4
    fillet4_edges = [part.edges().sort_by_distance(p)[0] for p in [
        (28.784729118, 0.7366, 20),
        (28.784729118, 28.197564596, 20),
        (-33.951870882, 28.197564596, 20),
        (-33.951870882, 0.7366, 20),
    ]]
    fillet(fillet4_edges, radius=FILLET4_R)

    # Sketch71 → Cut-Extrude19 (cut, through all)
    with BuildSketch(Plane.XY.offset(10.7366)):
        with Locations((-9.454494987, 13.710785706)):
            Circle(SKETCH71_R)
    extrude(amount=-CUT_EXTRUDE19_DEPTH, mode=Mode.SUBTRACT)


solid = part.part
